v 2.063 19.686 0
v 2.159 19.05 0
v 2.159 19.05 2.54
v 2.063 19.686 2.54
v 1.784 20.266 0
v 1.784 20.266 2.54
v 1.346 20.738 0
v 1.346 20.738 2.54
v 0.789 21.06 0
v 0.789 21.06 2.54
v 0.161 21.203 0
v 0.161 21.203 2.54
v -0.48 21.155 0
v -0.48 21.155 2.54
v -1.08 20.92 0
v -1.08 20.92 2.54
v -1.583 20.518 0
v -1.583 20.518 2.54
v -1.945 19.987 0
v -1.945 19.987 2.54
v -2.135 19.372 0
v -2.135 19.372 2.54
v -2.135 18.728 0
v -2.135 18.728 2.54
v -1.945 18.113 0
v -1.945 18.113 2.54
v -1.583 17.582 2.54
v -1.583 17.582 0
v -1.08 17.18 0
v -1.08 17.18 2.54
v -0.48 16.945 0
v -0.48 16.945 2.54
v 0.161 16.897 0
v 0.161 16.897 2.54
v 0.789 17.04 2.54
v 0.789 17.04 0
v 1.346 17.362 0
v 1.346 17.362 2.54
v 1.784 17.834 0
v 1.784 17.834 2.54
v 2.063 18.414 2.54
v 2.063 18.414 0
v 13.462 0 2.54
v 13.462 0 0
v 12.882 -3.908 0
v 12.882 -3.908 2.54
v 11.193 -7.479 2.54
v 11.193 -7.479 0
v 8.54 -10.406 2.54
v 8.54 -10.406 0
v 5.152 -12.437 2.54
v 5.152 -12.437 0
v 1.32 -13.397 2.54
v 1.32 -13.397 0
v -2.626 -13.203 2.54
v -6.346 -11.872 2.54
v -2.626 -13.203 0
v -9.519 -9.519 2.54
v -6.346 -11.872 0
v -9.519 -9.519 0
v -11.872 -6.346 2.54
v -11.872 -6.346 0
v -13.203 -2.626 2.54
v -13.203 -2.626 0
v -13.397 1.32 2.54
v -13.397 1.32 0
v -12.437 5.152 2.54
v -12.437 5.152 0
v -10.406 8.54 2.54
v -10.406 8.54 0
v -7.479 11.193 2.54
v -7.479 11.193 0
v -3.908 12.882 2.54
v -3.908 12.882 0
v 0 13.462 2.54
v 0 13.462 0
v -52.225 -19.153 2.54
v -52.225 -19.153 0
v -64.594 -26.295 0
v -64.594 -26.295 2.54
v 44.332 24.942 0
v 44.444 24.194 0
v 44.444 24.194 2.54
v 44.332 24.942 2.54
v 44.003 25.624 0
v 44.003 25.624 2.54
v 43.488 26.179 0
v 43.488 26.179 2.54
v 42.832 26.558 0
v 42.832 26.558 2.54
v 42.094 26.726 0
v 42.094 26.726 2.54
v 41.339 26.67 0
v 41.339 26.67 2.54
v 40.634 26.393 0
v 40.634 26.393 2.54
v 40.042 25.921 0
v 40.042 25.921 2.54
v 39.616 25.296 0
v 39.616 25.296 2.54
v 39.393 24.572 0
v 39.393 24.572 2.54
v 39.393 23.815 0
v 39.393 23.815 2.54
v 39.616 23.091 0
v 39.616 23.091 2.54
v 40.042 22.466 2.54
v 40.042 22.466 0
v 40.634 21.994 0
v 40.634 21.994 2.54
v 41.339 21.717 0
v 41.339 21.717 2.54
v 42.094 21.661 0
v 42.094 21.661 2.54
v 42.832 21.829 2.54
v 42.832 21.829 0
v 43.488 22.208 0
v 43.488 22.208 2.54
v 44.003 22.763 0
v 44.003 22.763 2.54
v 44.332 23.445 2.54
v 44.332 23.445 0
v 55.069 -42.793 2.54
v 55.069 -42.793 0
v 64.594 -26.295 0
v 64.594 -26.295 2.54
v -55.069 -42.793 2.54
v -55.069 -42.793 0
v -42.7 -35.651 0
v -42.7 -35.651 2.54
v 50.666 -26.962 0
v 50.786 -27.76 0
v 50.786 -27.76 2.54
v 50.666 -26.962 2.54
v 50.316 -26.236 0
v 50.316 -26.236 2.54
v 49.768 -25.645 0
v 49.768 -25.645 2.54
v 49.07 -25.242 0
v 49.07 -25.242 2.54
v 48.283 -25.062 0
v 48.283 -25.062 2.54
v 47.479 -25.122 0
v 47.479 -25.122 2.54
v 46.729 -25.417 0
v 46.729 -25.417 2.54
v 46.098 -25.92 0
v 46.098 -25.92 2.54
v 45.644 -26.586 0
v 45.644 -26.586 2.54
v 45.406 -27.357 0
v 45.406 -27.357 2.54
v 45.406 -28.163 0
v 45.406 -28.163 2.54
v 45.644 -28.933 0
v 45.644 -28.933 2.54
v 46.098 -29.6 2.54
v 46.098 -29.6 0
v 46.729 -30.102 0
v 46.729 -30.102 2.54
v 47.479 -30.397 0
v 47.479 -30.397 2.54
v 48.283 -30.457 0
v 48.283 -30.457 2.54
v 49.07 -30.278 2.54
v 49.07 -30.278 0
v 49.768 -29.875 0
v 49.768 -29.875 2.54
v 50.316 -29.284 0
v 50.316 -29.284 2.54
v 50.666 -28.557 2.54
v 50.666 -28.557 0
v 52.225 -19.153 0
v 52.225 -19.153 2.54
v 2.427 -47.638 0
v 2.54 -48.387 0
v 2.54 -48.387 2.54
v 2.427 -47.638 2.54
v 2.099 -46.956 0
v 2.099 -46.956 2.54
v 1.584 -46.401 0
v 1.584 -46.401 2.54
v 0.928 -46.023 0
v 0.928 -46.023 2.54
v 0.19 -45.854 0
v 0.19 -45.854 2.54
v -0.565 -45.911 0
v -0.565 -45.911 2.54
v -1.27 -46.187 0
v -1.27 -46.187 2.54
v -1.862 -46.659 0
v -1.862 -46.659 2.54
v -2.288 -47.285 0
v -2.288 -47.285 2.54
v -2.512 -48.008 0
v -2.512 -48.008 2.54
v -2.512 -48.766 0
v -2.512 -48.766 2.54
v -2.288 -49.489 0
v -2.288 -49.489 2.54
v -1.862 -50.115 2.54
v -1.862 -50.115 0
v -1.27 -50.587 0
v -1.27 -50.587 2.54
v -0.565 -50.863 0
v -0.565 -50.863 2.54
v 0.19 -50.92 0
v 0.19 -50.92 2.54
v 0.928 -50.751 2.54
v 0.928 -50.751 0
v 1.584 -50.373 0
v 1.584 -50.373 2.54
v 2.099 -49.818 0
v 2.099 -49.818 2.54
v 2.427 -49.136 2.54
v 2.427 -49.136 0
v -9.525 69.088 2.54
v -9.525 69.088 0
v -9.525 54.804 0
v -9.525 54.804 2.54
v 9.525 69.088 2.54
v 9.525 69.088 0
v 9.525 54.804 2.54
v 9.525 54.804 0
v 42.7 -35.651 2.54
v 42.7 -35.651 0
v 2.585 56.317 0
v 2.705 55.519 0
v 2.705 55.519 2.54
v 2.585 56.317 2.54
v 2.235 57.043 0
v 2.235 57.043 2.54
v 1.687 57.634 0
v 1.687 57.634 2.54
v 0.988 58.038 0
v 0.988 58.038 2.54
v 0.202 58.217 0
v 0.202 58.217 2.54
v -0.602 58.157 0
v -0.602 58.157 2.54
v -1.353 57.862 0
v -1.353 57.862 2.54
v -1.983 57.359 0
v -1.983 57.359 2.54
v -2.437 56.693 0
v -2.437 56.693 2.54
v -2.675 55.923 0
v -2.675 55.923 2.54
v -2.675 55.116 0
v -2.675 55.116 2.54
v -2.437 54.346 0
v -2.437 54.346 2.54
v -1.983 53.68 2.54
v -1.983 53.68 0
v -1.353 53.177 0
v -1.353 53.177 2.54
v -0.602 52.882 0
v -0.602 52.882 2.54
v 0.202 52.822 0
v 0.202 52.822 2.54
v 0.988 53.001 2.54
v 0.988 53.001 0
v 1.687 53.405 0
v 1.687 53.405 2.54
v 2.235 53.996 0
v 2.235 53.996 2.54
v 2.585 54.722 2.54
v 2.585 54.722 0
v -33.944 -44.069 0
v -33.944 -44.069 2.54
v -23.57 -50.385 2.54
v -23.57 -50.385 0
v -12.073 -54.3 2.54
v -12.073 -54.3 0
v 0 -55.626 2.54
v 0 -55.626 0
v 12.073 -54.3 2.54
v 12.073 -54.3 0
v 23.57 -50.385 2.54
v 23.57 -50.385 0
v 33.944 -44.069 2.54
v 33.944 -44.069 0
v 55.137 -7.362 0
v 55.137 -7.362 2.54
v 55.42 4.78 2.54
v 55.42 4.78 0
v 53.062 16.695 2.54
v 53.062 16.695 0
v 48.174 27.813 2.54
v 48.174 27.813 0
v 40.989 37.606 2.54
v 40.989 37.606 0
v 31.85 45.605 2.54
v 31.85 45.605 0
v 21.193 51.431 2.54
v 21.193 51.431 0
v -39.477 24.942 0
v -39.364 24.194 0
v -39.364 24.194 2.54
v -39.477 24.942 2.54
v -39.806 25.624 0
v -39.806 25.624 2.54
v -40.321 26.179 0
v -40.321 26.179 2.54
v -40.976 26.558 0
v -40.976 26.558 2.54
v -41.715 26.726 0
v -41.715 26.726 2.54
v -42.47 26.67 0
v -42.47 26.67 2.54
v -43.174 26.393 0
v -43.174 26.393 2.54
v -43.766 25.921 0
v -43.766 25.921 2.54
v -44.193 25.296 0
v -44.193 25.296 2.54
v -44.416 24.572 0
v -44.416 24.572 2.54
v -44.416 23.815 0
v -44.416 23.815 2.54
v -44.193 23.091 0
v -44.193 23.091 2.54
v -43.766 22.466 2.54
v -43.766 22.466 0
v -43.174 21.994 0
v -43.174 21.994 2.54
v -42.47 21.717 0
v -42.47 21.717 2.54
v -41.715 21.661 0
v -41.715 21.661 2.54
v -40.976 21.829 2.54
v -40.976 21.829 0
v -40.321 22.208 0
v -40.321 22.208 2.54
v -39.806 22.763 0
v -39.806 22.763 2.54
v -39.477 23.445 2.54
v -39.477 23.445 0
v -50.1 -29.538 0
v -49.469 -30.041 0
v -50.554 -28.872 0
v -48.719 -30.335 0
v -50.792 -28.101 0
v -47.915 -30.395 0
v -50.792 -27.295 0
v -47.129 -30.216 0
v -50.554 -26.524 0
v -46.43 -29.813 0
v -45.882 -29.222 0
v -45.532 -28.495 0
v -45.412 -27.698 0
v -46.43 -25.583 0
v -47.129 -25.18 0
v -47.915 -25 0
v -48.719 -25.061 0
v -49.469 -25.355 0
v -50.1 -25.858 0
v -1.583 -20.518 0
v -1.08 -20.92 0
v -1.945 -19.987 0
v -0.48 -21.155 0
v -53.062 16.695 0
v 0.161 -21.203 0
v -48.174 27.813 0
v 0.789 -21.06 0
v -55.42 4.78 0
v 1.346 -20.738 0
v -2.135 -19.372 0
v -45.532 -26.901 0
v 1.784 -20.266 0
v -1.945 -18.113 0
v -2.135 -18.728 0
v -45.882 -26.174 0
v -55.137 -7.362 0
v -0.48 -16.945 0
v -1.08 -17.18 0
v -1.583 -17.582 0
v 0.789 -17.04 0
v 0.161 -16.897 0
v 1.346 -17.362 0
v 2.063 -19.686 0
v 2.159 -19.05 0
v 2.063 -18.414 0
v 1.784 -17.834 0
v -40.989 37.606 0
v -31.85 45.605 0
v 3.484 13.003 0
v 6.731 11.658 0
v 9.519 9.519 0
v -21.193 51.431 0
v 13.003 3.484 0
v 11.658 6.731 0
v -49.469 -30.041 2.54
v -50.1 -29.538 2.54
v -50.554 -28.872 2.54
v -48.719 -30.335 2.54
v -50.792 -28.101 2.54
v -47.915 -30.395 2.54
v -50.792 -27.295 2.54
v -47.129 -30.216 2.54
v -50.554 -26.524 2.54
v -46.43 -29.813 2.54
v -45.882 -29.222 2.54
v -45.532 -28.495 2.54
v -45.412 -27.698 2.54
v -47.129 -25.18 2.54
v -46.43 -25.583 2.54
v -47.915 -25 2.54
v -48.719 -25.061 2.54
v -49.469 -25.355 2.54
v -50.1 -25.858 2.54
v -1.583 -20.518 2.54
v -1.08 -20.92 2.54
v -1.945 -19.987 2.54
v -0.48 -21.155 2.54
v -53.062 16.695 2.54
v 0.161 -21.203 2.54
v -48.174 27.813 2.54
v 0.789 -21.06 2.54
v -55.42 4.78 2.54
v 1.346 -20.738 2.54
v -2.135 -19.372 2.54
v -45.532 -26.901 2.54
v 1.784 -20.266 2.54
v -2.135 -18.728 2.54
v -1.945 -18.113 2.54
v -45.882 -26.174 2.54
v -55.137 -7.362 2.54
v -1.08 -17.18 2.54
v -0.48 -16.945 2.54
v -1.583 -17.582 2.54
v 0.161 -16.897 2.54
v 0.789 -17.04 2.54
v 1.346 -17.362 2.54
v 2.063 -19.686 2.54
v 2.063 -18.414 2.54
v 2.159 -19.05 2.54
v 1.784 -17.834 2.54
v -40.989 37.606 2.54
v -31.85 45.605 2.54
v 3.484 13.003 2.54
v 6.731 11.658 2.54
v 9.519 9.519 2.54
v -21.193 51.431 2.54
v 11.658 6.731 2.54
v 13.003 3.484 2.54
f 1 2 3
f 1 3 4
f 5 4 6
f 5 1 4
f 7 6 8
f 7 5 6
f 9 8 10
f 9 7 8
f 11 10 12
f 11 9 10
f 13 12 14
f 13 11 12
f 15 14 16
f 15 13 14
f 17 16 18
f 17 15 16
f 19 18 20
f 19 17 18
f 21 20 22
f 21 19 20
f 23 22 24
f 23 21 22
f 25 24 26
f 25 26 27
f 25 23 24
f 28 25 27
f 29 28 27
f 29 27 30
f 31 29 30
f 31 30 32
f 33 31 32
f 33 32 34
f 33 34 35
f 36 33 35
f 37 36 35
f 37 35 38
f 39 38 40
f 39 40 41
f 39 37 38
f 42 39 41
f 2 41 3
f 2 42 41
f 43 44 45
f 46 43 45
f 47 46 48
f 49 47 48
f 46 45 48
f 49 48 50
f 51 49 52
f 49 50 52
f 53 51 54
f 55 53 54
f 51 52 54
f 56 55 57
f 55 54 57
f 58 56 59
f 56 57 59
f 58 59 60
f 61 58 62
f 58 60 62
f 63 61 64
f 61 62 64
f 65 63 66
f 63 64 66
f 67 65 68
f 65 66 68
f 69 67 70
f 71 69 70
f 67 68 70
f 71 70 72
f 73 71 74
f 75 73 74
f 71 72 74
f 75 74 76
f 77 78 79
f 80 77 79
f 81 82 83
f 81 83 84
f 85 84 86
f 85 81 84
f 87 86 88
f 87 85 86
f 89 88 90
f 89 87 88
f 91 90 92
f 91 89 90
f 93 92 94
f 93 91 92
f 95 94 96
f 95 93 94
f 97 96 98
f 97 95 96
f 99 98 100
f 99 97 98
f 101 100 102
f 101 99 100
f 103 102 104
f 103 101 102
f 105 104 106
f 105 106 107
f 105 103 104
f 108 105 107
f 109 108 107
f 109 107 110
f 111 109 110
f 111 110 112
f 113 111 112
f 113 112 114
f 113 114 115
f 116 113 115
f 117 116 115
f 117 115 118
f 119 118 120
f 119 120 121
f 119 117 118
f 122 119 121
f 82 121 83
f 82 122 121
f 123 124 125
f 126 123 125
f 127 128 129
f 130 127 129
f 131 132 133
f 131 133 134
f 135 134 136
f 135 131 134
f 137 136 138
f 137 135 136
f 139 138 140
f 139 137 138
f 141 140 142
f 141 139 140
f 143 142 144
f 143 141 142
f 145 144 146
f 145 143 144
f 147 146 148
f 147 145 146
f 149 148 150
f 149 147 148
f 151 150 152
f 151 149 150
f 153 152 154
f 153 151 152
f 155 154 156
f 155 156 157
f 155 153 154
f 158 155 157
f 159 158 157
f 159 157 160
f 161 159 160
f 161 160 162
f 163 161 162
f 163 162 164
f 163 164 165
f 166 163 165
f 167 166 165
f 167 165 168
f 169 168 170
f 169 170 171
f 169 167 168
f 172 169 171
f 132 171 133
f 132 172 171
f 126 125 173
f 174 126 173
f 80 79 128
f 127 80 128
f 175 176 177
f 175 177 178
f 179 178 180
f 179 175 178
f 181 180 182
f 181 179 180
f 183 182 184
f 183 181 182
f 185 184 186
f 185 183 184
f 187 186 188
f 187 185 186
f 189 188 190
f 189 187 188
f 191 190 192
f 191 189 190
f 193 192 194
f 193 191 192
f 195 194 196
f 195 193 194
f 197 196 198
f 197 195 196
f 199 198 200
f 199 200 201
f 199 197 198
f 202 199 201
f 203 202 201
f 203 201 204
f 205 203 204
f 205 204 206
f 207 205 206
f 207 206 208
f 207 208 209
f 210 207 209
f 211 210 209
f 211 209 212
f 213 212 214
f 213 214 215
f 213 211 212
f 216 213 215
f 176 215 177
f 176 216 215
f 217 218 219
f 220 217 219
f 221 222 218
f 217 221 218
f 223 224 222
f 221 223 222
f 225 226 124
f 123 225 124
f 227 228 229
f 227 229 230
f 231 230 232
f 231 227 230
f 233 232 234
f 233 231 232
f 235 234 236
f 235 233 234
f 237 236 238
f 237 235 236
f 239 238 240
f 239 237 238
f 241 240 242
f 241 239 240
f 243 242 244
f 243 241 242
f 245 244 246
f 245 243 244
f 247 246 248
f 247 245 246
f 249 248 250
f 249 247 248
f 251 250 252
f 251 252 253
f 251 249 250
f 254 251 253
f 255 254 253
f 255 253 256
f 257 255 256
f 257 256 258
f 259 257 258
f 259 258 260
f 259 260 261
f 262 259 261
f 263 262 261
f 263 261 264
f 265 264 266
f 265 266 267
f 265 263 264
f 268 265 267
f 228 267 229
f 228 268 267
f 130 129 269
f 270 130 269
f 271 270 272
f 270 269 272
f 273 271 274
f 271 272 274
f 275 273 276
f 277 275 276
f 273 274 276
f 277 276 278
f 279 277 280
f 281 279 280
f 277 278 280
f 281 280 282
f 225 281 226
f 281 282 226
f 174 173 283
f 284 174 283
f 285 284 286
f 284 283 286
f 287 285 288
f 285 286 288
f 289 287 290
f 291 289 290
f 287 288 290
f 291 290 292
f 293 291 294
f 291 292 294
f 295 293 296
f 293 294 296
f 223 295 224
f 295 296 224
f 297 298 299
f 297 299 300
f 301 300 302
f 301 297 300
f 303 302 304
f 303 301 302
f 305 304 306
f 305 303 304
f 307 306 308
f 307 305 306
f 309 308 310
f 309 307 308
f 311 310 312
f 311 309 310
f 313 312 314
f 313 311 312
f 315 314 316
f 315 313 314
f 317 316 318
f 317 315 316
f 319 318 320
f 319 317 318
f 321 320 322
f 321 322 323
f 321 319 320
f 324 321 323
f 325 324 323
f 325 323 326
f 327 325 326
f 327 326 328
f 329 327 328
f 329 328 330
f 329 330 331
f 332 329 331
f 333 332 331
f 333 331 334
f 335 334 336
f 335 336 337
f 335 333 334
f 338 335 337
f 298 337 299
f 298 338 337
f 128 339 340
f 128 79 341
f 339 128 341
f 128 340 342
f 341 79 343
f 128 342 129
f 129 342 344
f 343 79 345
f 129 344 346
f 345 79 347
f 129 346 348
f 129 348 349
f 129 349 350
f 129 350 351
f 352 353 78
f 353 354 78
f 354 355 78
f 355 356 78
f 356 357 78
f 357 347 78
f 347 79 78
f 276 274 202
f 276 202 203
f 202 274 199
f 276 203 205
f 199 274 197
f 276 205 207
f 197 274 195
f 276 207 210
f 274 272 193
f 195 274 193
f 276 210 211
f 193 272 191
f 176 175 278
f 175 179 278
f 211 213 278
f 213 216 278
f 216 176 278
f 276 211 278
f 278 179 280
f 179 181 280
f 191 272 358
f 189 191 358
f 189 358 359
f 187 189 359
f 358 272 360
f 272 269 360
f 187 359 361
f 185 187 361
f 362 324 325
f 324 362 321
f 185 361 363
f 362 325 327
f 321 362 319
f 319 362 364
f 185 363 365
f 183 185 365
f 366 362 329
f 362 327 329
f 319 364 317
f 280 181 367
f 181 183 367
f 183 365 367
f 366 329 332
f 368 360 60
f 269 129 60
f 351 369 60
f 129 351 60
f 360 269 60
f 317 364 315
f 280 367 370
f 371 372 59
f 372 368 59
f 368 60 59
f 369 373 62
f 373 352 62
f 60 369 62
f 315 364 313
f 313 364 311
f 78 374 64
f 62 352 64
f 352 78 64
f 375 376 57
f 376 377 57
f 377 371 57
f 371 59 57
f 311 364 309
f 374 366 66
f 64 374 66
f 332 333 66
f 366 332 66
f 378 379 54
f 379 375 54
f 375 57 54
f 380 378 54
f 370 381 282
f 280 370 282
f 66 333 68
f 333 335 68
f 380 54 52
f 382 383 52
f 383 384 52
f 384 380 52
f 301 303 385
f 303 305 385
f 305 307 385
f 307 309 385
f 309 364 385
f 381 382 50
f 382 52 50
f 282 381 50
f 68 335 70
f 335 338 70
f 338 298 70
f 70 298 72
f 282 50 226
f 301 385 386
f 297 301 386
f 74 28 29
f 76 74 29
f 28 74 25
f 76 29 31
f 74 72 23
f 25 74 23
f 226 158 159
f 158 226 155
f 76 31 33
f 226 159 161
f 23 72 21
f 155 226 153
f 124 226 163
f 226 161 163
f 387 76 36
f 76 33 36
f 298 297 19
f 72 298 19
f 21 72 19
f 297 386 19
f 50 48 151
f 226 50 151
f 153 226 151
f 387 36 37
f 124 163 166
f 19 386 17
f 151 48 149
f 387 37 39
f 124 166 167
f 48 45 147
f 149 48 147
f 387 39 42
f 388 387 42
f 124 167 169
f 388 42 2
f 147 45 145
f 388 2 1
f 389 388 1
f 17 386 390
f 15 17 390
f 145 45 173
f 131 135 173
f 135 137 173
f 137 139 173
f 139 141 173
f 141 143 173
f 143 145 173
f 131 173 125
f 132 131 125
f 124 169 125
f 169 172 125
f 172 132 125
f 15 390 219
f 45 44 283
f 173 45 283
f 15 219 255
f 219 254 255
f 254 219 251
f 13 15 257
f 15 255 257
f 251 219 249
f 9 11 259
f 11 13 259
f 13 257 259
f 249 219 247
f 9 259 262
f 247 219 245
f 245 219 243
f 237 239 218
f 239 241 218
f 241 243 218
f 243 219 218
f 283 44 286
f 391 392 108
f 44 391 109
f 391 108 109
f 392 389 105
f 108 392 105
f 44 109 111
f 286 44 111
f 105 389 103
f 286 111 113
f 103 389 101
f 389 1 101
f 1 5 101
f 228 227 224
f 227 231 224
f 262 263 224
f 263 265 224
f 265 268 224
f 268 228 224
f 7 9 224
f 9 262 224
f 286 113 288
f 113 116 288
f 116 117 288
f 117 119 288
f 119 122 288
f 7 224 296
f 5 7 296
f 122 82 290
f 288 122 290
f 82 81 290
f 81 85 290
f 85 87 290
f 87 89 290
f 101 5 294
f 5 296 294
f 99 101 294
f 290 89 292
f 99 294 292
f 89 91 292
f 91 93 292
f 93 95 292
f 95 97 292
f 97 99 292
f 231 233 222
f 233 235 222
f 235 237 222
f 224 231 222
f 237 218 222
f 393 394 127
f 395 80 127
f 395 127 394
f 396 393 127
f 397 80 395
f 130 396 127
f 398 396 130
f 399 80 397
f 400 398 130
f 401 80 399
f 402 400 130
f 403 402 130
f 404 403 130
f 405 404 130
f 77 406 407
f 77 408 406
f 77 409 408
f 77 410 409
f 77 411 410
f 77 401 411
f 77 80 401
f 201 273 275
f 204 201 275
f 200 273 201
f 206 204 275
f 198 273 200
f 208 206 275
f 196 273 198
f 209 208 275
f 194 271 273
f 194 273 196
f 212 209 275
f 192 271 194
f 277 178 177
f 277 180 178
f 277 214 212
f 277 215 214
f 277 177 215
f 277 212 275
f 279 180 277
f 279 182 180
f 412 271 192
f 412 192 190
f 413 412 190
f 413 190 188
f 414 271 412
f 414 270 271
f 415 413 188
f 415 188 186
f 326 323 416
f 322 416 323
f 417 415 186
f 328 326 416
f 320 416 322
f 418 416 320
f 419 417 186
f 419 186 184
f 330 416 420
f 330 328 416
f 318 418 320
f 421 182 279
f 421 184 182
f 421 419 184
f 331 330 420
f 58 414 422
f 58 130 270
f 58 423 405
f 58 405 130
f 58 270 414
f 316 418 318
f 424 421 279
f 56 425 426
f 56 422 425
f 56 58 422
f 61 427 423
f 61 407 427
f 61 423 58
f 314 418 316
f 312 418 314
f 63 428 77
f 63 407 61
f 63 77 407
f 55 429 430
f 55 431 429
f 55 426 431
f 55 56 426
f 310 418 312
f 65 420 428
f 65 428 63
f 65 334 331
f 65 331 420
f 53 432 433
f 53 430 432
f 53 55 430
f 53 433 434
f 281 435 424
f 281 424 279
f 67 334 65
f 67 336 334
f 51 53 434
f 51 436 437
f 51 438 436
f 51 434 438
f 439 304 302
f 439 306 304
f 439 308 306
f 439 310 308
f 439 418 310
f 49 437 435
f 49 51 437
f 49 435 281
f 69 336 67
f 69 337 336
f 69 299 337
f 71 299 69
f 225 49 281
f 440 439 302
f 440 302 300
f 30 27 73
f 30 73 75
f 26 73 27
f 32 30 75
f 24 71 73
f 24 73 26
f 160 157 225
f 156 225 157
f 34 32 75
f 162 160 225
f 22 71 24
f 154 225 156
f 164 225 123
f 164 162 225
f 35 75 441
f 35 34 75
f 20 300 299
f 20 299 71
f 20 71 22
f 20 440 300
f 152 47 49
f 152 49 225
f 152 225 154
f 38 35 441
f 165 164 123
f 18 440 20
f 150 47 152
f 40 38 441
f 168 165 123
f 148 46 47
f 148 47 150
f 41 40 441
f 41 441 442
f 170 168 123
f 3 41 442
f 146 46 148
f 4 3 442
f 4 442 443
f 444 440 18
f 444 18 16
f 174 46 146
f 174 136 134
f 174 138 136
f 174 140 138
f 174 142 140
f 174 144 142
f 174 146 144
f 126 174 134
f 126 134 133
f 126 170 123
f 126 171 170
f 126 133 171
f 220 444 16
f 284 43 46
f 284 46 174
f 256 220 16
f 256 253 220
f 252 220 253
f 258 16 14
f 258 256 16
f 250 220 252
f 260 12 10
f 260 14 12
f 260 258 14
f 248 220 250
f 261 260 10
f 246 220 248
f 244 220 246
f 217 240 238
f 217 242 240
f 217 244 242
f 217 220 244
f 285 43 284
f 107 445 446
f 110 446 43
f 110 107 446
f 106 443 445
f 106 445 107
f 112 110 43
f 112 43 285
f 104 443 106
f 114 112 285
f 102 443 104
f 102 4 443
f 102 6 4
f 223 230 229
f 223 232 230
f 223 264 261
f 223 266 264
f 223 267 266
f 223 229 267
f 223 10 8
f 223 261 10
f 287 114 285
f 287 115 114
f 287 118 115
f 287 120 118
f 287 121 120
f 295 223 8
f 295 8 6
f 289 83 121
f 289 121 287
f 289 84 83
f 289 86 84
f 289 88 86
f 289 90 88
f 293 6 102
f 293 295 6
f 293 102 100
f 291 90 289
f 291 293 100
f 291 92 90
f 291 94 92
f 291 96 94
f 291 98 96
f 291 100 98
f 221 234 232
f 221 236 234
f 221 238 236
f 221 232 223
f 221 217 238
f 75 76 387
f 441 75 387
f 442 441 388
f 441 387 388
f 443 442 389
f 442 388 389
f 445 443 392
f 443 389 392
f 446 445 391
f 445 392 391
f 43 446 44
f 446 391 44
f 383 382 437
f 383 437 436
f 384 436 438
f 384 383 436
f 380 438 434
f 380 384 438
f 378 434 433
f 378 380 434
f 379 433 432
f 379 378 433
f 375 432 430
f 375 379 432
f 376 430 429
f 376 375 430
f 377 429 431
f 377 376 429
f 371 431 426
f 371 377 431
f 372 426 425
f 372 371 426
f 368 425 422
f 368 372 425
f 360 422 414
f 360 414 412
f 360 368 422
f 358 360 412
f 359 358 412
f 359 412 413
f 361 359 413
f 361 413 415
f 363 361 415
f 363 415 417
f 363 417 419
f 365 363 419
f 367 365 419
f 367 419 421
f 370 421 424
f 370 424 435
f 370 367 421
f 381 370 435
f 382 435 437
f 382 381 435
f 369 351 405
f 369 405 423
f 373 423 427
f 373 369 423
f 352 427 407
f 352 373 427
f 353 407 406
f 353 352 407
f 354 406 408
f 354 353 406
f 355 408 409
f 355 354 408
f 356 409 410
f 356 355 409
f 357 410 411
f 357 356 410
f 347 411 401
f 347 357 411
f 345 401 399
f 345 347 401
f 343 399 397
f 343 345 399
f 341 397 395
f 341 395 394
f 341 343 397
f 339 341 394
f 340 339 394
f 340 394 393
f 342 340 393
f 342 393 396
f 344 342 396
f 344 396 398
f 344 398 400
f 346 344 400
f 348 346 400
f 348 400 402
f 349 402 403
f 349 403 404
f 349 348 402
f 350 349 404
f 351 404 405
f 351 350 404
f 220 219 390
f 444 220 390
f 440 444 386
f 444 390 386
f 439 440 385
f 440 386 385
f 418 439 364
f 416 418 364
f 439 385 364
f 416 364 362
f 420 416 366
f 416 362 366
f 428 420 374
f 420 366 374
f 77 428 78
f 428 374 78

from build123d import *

# Parameters (mm, degrees)
F1_DEPTH = 2.54
F2_R     = 2.159
F3_R     = 2.7051
F4_R     = 2.54
F5_DEPTH = 2.54


with BuildPart() as f1:
    # F0 (on Top) → F1 (new body)
    with BuildSketch(Plane.XY):
        with BuildLine():
            Line((-9.525, 69.088), (-9.525, 54.8044364171))
            ThreePointArc((-9.525, 54.8044364171), (-48.1735291109, 27.813), (-52.2245341773, -19.1533262375))
            Line((-52.2245341773, -19.1533262375), (-64.5944630967, -26.295108029))
            Line((-64.5944630967, -26.295108029), (-55.0694630967, -42.792891971))
            Line((-55.0694630967, -42.792891971), (-42.6995341773, -35.6511101796))
            ThreePointArc((-42.6995341773, -35.6511101796), (0, -55.626), (42.6995341773, -35.6511101796))
            Line((42.6995341773, -35.6511101796), (55.0694630967, -42.792891971))
            Line((55.0694630967, -42.792891971), (64.5944630967, -26.295108029))
            Line((64.5944630967, -26.295108029), (52.2245341773, -19.1533262375))
            ThreePointArc((52.2245341773, -19.1533262375), (48.1735291109, 27.813), (9.525, 54.8044364171))
            Line((9.525, 54.8044364171), (9.525, 69.088))
            Line((9.525, 69.088), (-9.525, 69.088))
        make_face()
        with BuildLine():
            ThreePointArc((0, 13.462), (9.5190714883, 9.5190714883), (13.462, 0))
            ThreePointArc((13.462, 0), (-9.5190714883, -9.5190714883), (0, 13.462))
        make_face(mode=Mode.SUBTRACT)
    extrude(amount=F1_DEPTH)

    # F2 (on Top) + F3 (on Top) + F4 (on Top) → F5 (cut)
    with BuildSketch(Plane.XY):
        with Locations((0, 19.05)):
            Circle(F2_R)
        with Locations((0, -19.05)):
            Circle(F2_R)
    with BuildSketch(Plane.XY):
        with Locations((0, 55.519441794)):
            Circle(F3_R)
        with Locations((-48.1168723708, -27.697924297)):
            Circle(F3_R)
        with Locations((48.0812469975, -27.759720897)):
            Circle(F3_R)
    with BuildSketch(Plane.XY):
        with Locations((-41.9043712129, 24.1935)):
            Circle(F4_R)
        with Locations((41.9043712129, 24.1935)):
            Circle(F4_R)
        with Locations((0, -48.387)):
            Circle(F4_R)
    extrude(amount=F5_DEPTH, mode=Mode.SUBTRACT)


solid = f1.part
